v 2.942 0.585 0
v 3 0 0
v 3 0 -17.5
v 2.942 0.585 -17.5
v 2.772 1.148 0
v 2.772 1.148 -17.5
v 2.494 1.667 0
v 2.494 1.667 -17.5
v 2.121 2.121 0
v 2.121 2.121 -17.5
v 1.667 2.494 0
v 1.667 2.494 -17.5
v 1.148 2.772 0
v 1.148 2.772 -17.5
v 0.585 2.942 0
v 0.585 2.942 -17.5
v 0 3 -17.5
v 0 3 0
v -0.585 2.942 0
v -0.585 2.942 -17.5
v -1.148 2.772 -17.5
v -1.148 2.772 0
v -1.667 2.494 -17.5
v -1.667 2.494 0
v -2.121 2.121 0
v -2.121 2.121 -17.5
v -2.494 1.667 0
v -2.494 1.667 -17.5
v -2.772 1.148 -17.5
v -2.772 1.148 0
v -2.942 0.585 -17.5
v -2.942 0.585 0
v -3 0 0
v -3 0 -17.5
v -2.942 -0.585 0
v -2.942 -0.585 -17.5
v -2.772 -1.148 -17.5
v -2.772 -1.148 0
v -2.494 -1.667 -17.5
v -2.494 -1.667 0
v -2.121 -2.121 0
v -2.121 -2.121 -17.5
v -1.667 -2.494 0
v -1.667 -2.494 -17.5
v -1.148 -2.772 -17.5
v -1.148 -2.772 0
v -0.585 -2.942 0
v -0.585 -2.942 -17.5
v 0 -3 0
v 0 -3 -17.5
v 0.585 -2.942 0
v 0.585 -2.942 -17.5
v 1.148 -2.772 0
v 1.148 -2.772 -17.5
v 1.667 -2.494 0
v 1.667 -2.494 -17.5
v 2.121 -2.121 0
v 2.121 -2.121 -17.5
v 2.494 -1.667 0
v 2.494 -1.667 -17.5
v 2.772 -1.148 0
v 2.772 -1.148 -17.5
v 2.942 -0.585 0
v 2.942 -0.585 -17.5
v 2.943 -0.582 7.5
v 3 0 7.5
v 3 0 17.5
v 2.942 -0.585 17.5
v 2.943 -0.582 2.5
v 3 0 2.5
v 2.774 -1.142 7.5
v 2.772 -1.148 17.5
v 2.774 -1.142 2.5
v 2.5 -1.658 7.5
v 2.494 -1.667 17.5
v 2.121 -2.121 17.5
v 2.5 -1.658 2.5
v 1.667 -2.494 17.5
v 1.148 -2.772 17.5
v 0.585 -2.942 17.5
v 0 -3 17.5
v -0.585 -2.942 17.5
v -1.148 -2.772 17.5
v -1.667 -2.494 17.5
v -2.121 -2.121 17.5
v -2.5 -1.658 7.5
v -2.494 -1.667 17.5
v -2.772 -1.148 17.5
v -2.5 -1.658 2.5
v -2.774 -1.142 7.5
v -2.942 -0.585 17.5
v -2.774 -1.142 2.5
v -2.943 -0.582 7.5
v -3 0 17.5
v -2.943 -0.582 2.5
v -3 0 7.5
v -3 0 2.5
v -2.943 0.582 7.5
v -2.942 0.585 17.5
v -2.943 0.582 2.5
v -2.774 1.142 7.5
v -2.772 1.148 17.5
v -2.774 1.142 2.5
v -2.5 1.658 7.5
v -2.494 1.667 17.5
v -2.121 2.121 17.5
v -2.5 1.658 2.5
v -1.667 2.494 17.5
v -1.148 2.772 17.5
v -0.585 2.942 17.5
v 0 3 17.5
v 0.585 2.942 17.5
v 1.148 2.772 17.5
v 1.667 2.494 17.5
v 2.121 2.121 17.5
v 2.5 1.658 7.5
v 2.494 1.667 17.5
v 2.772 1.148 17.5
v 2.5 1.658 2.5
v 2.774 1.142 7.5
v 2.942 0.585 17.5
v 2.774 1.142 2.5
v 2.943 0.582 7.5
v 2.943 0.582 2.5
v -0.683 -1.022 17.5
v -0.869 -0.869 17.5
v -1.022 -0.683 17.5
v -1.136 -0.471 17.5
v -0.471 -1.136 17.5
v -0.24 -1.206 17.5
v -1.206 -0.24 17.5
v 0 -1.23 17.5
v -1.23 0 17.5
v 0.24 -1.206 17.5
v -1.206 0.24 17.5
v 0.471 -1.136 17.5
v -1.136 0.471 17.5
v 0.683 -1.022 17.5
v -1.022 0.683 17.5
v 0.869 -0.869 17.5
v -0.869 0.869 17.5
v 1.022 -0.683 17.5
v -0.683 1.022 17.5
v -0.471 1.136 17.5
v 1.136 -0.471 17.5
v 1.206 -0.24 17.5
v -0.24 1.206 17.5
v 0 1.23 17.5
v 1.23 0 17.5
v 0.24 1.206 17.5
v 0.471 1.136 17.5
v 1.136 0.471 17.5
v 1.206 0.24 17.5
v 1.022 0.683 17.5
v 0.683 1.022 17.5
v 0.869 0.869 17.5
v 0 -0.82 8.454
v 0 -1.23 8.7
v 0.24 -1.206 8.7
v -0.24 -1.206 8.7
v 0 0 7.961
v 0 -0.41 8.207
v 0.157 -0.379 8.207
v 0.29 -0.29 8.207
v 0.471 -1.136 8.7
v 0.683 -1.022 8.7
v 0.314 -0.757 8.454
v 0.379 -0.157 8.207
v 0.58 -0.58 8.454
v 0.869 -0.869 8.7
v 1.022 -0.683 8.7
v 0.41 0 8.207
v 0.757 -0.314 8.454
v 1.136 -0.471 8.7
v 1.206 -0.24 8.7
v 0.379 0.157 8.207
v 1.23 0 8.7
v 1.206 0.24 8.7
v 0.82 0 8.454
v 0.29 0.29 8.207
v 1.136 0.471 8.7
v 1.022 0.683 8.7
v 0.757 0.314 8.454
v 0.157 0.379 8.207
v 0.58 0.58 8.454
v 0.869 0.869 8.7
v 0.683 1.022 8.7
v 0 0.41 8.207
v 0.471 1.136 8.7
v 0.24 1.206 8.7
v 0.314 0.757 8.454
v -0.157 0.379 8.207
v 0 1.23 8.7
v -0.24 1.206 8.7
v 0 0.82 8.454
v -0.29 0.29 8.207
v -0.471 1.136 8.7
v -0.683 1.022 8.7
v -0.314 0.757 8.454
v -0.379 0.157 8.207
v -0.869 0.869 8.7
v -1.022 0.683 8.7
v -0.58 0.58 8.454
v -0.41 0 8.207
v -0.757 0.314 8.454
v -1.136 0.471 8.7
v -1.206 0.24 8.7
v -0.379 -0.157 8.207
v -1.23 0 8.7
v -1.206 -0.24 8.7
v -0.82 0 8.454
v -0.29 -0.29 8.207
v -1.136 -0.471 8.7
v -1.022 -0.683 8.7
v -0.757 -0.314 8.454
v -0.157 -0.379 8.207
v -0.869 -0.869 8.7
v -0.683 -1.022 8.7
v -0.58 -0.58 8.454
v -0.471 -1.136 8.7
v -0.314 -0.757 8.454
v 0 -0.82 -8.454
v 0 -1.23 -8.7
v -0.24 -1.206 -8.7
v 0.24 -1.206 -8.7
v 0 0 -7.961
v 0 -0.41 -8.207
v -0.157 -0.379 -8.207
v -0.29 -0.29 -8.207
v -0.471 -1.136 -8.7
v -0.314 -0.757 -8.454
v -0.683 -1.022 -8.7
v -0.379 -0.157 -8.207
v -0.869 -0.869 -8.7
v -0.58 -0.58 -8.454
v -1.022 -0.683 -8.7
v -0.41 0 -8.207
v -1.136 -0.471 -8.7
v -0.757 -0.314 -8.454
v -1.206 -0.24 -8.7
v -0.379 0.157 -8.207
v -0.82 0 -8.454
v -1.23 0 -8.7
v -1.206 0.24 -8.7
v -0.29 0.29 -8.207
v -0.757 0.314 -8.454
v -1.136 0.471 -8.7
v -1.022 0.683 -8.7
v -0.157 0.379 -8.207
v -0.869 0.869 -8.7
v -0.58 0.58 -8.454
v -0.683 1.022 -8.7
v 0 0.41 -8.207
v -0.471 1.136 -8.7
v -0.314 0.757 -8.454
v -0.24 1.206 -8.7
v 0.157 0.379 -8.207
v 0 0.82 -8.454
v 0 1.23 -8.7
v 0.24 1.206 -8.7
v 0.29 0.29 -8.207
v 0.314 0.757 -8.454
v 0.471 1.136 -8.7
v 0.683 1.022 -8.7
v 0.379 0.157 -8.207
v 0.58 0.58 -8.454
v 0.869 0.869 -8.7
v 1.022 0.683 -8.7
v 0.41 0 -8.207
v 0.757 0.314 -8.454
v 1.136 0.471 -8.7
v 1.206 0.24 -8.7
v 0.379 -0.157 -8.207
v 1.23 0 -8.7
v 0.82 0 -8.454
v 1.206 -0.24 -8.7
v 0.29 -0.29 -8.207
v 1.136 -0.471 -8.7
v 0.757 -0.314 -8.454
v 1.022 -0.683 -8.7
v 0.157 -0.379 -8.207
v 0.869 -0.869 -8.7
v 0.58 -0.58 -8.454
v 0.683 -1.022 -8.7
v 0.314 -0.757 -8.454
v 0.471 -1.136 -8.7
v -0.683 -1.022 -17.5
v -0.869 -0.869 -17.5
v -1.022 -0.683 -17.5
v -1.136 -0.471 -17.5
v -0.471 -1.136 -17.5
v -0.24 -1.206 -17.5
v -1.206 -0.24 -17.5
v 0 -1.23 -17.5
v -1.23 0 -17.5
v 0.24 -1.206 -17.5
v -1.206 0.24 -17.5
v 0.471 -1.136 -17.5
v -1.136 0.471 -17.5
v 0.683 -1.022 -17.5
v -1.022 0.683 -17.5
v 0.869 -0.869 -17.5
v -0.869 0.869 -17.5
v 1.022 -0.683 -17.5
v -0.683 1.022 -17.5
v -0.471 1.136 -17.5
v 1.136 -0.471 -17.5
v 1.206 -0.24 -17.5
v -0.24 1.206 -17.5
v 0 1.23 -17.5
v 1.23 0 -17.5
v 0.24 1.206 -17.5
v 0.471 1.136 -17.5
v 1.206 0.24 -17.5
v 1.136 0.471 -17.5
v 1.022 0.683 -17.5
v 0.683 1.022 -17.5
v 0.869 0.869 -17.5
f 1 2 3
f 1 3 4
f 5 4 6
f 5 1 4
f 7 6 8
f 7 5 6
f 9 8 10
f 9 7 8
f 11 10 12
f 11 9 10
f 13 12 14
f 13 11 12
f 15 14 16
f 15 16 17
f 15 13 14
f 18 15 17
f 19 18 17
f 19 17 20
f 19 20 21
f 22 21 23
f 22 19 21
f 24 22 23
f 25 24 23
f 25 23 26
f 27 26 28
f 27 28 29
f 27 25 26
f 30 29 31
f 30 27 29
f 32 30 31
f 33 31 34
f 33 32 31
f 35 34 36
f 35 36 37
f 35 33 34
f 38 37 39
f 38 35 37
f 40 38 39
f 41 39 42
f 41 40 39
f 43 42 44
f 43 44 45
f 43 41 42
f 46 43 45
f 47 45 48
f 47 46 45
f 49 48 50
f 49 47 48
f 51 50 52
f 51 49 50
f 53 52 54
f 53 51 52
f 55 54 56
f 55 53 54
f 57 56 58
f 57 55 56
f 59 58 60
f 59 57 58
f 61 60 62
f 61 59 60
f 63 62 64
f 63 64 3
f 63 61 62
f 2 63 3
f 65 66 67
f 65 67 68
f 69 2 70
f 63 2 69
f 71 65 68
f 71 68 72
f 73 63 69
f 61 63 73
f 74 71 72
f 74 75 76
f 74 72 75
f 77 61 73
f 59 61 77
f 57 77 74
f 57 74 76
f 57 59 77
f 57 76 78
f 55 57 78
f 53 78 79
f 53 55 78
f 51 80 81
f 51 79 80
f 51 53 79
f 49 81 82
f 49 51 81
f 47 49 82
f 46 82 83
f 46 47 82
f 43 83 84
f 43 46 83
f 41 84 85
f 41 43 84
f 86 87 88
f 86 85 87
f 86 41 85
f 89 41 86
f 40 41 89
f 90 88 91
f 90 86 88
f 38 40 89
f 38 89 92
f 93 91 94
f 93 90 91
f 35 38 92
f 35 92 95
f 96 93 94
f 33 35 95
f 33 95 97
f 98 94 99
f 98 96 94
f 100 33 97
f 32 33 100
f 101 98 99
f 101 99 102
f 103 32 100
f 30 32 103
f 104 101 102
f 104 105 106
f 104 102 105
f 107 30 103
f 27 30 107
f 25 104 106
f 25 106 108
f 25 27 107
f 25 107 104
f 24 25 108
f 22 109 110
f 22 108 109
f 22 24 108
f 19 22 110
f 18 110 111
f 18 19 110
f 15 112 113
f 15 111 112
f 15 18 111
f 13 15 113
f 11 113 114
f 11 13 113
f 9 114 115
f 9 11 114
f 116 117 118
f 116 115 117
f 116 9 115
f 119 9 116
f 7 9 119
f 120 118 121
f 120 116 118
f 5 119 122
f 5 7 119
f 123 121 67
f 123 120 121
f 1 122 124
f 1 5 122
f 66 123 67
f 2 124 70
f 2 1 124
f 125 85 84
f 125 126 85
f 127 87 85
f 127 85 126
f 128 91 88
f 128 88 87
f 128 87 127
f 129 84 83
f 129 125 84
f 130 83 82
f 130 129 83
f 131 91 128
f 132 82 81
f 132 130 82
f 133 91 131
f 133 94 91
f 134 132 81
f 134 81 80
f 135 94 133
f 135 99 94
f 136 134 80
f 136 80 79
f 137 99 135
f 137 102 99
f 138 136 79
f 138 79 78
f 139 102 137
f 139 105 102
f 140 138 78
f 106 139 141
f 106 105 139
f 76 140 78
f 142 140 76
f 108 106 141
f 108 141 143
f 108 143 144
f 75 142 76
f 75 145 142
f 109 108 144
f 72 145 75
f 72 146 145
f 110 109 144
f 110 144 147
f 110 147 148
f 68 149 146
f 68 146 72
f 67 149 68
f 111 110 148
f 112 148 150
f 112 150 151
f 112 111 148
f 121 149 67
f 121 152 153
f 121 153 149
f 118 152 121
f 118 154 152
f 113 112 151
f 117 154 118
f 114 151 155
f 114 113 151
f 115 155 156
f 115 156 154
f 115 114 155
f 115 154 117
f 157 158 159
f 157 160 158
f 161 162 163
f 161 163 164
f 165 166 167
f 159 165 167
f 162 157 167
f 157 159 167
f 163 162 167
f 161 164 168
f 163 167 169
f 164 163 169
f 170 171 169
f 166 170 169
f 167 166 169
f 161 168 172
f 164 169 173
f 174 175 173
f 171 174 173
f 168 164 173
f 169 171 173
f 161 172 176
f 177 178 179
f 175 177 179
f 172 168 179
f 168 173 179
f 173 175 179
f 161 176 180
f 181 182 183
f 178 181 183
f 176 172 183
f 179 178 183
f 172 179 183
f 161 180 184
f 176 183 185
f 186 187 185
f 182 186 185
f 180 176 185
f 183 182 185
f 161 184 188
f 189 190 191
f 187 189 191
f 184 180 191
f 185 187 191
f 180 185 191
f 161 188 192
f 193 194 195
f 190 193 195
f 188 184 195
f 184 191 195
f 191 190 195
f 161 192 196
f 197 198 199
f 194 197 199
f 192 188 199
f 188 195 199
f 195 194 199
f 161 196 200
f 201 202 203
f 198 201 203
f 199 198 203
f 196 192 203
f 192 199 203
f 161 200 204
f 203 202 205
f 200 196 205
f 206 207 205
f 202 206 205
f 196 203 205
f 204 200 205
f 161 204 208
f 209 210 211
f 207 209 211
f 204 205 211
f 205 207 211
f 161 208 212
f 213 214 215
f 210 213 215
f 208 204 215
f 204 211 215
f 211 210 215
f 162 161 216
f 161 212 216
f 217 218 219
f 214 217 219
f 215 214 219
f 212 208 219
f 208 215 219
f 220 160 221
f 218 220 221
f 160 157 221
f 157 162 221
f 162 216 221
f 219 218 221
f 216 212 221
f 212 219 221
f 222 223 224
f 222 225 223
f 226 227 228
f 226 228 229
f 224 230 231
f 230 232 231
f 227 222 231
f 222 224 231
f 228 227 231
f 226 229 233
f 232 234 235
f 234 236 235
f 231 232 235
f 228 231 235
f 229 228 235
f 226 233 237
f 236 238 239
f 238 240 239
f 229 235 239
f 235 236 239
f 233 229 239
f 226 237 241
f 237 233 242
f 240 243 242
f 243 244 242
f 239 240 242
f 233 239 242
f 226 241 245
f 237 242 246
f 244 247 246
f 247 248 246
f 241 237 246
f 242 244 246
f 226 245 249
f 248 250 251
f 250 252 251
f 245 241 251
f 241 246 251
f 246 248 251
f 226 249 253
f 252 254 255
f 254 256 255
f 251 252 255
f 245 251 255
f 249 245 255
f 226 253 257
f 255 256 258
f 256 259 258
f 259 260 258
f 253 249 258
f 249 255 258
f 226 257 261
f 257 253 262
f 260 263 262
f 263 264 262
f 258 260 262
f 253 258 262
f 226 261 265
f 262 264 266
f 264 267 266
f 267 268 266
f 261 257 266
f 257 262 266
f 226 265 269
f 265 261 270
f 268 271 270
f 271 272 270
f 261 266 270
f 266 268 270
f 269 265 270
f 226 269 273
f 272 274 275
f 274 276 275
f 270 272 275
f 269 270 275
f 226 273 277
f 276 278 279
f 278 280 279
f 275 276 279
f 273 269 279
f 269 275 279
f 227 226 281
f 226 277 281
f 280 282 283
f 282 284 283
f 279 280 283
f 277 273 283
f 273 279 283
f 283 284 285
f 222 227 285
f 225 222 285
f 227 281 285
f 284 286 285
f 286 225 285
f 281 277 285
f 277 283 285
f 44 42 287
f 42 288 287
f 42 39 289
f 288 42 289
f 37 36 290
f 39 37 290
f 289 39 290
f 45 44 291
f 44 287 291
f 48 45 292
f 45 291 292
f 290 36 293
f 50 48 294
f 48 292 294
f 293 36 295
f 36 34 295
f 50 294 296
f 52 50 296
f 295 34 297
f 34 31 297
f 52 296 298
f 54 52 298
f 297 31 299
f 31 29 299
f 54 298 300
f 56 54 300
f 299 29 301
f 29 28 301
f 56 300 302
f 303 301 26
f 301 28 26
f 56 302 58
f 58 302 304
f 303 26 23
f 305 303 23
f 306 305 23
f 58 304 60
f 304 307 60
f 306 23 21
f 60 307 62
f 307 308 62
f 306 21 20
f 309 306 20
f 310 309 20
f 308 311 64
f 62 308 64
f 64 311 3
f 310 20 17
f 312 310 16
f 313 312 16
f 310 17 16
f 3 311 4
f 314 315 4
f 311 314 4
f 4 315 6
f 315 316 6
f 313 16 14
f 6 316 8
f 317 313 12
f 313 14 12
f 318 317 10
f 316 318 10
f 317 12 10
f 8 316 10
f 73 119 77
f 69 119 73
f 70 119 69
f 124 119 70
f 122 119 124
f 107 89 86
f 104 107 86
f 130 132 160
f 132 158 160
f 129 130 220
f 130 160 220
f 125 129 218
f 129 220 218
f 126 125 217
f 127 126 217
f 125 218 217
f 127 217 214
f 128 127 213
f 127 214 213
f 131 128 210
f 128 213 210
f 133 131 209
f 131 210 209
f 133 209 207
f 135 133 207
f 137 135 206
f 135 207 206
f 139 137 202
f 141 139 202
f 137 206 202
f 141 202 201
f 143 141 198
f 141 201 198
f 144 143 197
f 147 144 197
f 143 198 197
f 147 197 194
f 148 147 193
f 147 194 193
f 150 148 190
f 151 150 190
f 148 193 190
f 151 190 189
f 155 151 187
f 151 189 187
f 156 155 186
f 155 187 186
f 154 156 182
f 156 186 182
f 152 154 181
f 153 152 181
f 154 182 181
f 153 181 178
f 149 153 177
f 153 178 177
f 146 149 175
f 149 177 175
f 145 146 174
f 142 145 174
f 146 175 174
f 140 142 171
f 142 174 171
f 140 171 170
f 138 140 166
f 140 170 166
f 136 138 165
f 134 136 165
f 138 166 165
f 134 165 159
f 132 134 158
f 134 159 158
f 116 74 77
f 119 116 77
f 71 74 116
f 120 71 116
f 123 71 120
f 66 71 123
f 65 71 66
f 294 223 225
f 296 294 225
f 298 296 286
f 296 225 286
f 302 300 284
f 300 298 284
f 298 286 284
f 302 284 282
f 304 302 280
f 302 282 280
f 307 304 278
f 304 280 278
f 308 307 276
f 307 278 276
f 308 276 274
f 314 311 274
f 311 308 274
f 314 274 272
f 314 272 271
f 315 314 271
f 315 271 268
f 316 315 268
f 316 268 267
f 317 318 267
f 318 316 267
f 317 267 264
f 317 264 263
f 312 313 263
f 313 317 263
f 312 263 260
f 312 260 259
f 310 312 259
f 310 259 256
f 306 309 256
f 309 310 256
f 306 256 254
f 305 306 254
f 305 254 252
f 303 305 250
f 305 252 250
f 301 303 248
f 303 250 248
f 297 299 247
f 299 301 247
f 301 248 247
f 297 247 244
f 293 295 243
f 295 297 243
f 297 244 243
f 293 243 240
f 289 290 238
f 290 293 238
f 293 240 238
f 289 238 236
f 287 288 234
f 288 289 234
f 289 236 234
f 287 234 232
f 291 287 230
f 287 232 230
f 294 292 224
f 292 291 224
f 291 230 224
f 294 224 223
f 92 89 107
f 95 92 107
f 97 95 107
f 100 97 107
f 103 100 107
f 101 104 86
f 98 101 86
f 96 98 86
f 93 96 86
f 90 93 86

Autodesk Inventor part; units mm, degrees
ref_plane "YZ Plane" through (0, 0, 0) normal (1, 0, 0) x (0, 1, 0)
ref_plane "XZ Plane" through (0, 0, 0) normal (0, 1, 0) x (-1, 0, 0)
ref_plane "XY Plane" through (0, 0, 0) normal (0, 0, 1) x (1, 0, 0)
sketch "Sketch1" plane through (0, 0, 0) normal (0, 0, 1) x (1, 0, 0)
  circle A0 centre (0, 0) radius 3
  dimension "d0" = 6
extrude "Extrusion1" add sketch "Sketch1" along normal mid plane 35
sketch "Sketch2" plane through (0, 0, 17.5) normal (0, 0, 1) x (1, 0, 0)
  point P0 (0, 0)
  point P1 (0, 0)
hole "Hole1" at (0, 0, 17.5) direction (0, 0, -1) diameter 2.459 depth 8.8 tip angle 118 thread size "M3x0.5" class "6H" standard "ANSI Metric M Profile"
sketch "Sketch3" plane through (0, 0, 0) normal (0, 1, 0) x (-1, 0, 0)
  line L0 (3, 2.5) -> (2.5, 2.5)
  line L1 (2.5, 2.5) -> (2.5, 7.5)
  line L2 (2.5, 7.5) -> (3, 7.5)
  line L3 (3, 7.5) -> (3, 2.5)
  line L4 (-3, 7.5) -> (-2.5, 7.5)
  line L5 (-2.5, 7.5) -> (-2.5, 2.5)
  line L6 (-2.5, 2.5) -> (-3, 2.5)
  line L7 (-3, 2.5) -> (-3, 7.5)
  line L8 (-3, -17.5) -> (3, -17.5) projected
  line L9 (3, 17.5) -> (-3, 17.5) projected
  point P0 (0, 0)
  point P1 (-3, 23.75)
  dimension "d16" = 0.5
  dimension "d17" = 0.5
  dimension "d18" = 5
  dimension "d19" = 10
extrude "Extrusion2" cut sketch "Sketch3" along normal through all both and the other way through all
mirror "Mirror1" about plane through (0, 0, 0) normal (0, 0, 1) of "Hole1"
equation "\"d17\" = d16"
properties part number "Pancake_Connector" material "Aluminum 6061"
